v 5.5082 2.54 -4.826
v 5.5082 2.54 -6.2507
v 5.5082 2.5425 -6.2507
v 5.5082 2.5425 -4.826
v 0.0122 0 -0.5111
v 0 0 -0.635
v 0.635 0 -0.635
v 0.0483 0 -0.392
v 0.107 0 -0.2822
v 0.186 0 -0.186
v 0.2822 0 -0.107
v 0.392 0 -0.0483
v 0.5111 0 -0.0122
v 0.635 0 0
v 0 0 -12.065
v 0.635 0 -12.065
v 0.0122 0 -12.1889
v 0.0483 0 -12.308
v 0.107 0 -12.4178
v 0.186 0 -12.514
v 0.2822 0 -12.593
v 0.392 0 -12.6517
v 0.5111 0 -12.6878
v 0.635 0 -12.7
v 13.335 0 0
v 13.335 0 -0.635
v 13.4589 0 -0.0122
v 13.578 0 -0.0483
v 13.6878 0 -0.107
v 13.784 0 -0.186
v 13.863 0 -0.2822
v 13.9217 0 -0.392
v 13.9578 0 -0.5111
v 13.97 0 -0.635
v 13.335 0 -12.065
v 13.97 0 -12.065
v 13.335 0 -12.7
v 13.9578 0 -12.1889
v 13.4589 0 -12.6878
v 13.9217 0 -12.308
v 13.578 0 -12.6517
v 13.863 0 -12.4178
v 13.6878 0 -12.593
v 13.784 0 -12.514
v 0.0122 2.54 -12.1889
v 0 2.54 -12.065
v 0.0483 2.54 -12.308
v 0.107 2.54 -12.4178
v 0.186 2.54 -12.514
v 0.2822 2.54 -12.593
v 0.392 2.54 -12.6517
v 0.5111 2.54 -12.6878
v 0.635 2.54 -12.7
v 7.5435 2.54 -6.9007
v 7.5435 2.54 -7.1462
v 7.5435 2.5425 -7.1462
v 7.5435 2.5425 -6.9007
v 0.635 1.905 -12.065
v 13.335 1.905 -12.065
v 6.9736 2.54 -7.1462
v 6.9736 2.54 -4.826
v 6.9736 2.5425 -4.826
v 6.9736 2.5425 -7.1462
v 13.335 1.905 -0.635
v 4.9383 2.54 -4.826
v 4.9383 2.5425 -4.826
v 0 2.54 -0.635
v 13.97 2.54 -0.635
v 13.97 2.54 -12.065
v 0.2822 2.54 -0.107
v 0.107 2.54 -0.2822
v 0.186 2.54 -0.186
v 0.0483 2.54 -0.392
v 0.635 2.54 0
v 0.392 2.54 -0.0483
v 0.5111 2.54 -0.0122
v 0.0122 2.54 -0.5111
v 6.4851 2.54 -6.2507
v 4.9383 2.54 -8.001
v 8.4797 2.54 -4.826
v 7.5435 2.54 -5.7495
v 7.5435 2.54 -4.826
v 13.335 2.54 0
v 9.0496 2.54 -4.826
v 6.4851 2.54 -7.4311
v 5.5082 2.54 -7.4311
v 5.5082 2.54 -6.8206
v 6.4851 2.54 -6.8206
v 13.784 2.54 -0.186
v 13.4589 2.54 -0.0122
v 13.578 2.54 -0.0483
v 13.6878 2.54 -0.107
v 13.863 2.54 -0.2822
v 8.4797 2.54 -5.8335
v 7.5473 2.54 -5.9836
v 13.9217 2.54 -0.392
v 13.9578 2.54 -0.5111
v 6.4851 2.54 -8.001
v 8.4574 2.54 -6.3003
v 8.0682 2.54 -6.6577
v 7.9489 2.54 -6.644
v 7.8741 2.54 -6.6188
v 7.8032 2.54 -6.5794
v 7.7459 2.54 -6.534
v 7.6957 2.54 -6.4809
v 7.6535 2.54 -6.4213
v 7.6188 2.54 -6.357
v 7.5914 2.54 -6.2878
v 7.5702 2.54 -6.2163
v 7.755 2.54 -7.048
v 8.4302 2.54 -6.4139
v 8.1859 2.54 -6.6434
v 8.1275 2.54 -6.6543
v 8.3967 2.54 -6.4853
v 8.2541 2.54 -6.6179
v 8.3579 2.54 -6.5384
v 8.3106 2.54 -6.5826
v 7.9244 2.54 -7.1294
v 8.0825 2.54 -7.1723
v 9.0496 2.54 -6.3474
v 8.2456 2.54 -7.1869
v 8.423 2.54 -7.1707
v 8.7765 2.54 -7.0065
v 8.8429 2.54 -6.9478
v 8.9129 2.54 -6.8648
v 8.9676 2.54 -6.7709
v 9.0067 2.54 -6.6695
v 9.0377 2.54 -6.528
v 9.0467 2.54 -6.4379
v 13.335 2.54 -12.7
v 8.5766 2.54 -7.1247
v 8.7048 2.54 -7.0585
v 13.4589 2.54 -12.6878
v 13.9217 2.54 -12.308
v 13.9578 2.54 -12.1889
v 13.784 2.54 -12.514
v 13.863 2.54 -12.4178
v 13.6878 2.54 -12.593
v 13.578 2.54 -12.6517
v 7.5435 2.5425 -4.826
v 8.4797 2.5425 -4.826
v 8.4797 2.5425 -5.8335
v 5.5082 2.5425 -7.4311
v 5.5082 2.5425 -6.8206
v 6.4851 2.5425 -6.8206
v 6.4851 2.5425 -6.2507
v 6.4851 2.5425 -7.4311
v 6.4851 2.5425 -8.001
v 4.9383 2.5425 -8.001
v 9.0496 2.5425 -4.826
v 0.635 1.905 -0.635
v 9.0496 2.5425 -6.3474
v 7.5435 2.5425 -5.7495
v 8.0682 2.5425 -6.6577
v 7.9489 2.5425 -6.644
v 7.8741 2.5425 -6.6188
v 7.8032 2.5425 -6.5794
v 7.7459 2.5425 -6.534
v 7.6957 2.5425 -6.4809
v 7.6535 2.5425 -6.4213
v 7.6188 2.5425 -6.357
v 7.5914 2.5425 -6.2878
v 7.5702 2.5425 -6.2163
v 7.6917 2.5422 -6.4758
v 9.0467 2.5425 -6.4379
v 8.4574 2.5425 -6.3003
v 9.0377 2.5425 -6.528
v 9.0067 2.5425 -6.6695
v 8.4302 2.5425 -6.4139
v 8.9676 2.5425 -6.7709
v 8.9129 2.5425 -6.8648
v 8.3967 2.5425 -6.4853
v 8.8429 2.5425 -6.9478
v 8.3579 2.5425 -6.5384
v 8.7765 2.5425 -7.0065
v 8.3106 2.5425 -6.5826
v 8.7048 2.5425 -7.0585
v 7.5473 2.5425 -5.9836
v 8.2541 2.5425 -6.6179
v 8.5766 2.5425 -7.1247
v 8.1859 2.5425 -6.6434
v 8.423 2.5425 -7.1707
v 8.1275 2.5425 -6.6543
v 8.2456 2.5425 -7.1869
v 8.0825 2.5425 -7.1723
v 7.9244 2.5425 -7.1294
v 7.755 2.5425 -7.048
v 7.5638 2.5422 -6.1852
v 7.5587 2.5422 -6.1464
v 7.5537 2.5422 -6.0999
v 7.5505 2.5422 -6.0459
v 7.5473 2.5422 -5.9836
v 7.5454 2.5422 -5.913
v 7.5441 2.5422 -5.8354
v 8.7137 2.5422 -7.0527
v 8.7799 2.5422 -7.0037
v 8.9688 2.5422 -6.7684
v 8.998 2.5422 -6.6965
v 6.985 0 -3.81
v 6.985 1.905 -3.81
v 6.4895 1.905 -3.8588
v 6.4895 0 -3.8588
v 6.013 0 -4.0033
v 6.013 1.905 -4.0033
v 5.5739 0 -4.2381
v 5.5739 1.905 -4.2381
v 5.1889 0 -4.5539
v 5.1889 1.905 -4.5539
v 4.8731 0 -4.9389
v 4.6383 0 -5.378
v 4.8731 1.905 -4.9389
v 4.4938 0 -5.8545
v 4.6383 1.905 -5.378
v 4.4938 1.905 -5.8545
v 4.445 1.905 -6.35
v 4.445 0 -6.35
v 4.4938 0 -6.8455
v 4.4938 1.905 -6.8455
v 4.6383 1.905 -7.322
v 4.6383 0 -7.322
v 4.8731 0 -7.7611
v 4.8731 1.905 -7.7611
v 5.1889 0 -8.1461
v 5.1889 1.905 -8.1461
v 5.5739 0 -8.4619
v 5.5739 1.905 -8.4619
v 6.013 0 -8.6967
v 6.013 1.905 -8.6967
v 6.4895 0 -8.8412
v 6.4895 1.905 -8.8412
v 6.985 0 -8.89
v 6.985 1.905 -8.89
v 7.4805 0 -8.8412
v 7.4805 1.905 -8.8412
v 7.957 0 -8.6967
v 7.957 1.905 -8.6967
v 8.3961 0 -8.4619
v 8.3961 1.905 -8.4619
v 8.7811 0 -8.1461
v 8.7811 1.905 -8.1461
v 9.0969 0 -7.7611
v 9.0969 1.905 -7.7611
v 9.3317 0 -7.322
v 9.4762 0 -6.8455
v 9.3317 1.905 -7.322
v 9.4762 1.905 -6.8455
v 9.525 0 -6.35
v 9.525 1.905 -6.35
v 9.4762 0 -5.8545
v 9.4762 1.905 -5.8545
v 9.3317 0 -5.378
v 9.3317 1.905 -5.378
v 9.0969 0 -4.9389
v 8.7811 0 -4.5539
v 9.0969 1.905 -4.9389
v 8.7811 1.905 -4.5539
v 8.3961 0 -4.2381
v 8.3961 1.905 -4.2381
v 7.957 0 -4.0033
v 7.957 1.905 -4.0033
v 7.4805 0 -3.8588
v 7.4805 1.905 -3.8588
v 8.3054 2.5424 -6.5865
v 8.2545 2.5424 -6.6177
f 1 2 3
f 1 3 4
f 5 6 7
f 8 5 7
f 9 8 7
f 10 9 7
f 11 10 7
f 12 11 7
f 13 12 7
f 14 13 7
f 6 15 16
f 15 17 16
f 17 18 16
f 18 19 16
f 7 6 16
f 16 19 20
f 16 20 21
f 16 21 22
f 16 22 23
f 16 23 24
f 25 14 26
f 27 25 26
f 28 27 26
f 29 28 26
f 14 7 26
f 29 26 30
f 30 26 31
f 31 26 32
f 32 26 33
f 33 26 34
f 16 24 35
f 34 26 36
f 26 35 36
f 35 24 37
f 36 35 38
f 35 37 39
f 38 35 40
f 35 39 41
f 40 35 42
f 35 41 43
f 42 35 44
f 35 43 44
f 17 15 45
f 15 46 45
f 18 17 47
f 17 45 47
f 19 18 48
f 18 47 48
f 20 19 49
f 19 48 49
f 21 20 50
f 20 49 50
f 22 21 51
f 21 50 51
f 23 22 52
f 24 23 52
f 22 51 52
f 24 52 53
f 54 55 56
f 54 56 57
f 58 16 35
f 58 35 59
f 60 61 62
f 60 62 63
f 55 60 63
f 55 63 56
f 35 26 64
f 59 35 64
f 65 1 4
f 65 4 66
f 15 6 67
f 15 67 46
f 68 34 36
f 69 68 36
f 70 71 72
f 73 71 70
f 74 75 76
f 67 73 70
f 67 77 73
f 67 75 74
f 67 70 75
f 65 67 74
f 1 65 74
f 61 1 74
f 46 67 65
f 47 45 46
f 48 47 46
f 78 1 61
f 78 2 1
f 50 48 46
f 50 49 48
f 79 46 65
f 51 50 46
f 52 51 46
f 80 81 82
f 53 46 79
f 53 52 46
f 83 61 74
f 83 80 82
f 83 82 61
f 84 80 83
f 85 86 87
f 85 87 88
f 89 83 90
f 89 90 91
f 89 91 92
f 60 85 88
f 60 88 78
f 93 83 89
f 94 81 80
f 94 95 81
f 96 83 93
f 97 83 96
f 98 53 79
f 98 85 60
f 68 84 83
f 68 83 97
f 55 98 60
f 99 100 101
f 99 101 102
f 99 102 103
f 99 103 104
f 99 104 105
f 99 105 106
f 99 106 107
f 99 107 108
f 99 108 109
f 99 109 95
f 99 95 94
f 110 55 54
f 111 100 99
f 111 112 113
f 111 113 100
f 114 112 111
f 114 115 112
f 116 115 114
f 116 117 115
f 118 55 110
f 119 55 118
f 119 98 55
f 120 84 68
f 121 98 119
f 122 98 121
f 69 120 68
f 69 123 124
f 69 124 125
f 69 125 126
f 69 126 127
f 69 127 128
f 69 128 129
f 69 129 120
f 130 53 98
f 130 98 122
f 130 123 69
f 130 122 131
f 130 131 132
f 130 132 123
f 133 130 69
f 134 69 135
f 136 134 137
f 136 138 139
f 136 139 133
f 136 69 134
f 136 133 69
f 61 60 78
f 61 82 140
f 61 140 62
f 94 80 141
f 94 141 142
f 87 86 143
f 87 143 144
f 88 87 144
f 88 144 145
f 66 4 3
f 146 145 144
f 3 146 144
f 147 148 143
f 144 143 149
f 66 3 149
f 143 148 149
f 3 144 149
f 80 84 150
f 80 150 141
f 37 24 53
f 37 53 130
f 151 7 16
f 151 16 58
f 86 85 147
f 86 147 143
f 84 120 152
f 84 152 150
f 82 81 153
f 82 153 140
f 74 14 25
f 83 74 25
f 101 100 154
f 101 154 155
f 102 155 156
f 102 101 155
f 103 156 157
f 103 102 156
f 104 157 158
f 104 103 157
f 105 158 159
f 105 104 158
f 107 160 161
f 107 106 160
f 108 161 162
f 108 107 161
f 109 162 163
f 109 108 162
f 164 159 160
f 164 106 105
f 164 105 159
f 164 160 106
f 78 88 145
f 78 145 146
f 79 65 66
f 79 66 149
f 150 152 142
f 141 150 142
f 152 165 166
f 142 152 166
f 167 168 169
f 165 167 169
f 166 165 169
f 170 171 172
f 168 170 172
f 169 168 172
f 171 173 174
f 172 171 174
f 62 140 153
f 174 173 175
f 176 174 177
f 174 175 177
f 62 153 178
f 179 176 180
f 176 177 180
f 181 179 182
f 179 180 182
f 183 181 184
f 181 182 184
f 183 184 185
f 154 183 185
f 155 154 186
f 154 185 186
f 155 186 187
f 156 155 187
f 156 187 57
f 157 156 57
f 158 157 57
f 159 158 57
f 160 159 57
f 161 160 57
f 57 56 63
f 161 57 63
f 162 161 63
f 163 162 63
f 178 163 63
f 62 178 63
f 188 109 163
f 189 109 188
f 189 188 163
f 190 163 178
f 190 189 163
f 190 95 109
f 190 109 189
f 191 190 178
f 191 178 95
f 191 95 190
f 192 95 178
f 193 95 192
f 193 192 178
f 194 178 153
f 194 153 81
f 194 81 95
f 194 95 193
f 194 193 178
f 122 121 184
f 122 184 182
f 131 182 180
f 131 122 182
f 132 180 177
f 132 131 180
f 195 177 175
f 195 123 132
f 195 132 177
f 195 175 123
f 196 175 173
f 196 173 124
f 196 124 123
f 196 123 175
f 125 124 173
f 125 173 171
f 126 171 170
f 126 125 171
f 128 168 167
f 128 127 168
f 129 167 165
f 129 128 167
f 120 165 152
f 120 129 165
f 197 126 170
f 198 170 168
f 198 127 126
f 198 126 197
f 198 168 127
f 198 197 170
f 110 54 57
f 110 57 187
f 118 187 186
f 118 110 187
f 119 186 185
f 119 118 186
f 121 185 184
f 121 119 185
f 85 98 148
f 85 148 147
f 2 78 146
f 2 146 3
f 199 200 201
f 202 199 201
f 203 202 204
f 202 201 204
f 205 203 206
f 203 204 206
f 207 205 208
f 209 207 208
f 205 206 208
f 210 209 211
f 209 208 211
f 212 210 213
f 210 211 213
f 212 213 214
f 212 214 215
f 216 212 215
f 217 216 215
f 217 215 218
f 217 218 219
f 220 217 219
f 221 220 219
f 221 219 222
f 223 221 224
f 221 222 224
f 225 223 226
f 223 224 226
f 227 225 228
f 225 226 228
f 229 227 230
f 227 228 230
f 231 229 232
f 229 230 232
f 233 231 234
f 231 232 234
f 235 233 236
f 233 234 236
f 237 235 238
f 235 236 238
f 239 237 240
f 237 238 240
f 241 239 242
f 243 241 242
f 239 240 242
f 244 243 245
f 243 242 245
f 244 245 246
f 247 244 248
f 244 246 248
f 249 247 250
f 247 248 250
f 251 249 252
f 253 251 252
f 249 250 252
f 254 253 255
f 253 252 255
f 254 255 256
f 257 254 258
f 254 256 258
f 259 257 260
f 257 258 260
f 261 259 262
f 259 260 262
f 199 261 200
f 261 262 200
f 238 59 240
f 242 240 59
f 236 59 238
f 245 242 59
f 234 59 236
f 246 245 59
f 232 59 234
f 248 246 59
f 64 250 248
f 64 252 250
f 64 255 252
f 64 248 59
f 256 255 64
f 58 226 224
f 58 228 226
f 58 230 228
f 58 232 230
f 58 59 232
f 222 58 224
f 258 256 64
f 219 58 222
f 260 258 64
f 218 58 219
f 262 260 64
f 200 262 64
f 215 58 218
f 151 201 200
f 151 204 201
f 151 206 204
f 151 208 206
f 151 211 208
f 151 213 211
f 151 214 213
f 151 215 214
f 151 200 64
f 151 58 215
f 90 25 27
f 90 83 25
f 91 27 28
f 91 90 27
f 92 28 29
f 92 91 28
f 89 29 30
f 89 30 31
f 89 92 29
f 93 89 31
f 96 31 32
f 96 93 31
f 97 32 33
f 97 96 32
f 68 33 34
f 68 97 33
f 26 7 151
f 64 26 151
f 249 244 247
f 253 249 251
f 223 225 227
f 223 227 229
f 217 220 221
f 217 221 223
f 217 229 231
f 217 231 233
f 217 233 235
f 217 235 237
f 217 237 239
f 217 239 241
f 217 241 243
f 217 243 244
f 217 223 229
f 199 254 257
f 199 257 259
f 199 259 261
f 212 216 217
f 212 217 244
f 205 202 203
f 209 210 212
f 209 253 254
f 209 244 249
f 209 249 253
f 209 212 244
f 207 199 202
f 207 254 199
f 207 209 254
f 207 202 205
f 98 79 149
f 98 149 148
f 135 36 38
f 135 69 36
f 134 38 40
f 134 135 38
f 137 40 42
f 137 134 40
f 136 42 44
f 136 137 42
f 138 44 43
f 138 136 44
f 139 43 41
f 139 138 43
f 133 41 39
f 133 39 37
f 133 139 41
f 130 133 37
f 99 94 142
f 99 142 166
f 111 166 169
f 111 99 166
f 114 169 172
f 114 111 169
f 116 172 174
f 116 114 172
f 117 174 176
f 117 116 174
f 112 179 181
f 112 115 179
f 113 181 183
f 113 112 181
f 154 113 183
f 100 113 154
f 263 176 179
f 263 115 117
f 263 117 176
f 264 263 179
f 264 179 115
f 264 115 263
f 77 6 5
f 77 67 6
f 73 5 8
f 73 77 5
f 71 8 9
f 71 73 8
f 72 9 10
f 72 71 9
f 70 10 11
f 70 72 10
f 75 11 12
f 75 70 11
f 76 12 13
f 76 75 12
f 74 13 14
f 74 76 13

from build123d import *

# Parameters (mm, degrees)
SKETCH1_W           = 13.97
SKETCH1_H           = 12.7
BOSS_EXTRUDE1_DEPTH = 2.54
FILLET1_R           = 0.635
SHELL1_START        = 0.635
SHELL1_OUTLINE_W    = 1.905
SHELL1_OUTLINE_H    = 11.43
SHELL1_DEPTH        = 12.7
SKETCH2_R           = 2.54
BOSS_EXTRUDE2_DEPTH = 1.905
BOSS_EXTRUDE3_DEPTH = 0.00254


# Read off the part's stored shape, not the designer's step: Shell1
with BuildPart() as part:
    # Sketch1 → Boss-Extrude1 (new body)
    with BuildSketch(Plane(origin=(0, 0, 0), x_dir=(1, 0, 0), z_dir=(0, 1, 0))):
        with Locations((6.985, 6.35)):
            Rectangle(SKETCH1_W, SKETCH1_H)
    extrude(amount=BOSS_EXTRUDE1_DEPTH)

    # Fillet1
    fillet1_edges = [part.edges().sort_by_distance(p)[0] for p in [
        (0, 1.27, -12.7),
        (13.97, 1.27, -12.7),
        (13.97, 1.27, 0),
        (0, 1.27, 0),
    ]]
    fillet(fillet1_edges, radius=FILLET1_R)

    # Shell1 outline → Shell1 (cut)
    with BuildSketch(Plane.YZ.offset(SHELL1_START)):
        with Locations((0.9525, -6.35)):
            Rectangle(SHELL1_OUTLINE_W, SHELL1_OUTLINE_H)
    extrude(amount=SHELL1_DEPTH, mode=Mode.SUBTRACT)

    # Sketch2 → Boss-Extrude2 (add)
    with BuildSketch(Plane(origin=(0, 1.905, 0), x_dir=(-1, 0, 0), z_dir=(0, -1, 0))):
        with Locations(Location((-6.985, 6.35, 0), (0, 0, 270))):
            Circle(SKETCH2_R)
    extrude(amount=BOSS_EXTRUDE2_DEPTH)

    # Sketch3 → Boss-Extrude3 (add)
    with BuildSketch(Plane(origin=(0, 2.54, 0), x_dir=(1, 0, 0), z_dir=(0, 1, 0))):
        Polygon((4.938346154, 8.001), (6.485141026, 8.001), (6.485141026, 7.431128205), (5.508217949, 7.431128205), (5.508217949, 6.820551282), (6.485141026, 6.820551282), (6.485141026, 6.250679487), (5.508217949, 6.250679487), (5.508217949, 4.826), (4.938346154, 4.826), align=None)
        with BuildLine():
            Line((6.973602564, 7.146192308), (7.543474359, 7.146192308))
            Line((7.543474359, 7.146192308), (7.543474359, 6.900689503))
            add(Edge.make_bspline(
                [(7.543474359, 6.900689503), (7.575985262, 6.925977153), (7.638119919, 6.974306769), (7.732575324, 7.035927275), (7.821729533, 7.086361185), (7.907569887, 7.124723797), (7.991711475, 7.152324047), (8.075517031, 7.172153181), (8.160234588, 7.18485032), (8.217185351, 7.18621543), (8.245637821, 7.186897436)],
                knots=[0, 0, 0, 0, 1.276643801, 2.439914479, 3.493451431, 4.44993799, 5.350072675, 6.235028322, 7.118224225, 8, 8, 8, 8], degree=3))
            add(Edge.make_bspline(
                [(8.245637821, 7.186897436), (8.274499022, 7.186118044), (8.331155985, 7.184588033), (8.41458024, 7.173886845), (8.494284014, 7.154396591), (8.57116351, 7.128518806), (8.644436227, 7.094361613), (8.714999799, 7.053805489), (8.781338547, 7.004405385), (8.822192885, 6.966784638), (8.842858373, 6.947754808)],
                knots=[0, 0, 0, 0, 1.048836932, 2.058954983, 3.049370783, 4.026390553, 5.001981509, 5.982488534, 6.97947532, 8, 8, 8, 8], degree=3))
            add(Edge.make_bspline(
                [(8.842858373, 6.947754808), (8.859432856, 6.93011972), (8.892703126, 6.894720476), (8.934569582, 6.834143303), (8.970495709, 6.768103097), (8.999932179, 6.695838062), (9.021684544, 6.616951149), (9.038418936, 6.532395199), (9.047808895, 6.441696762), (9.048968129, 6.379387791), (9.049564103, 6.347354167)],
                knots=[0, 0, 0, 0, 0.889584746, 1.785680191, 2.700364693, 3.65222533, 4.649950538, 5.707241244, 6.821271309, 8, 8, 8, 8], degree=3))
            Line((9.049564103, 6.347354167), (9.049564103, 4.826))
            Line((9.049564103, 4.826), (8.479692308, 4.826))
            Line((8.479692308, 4.826), (8.479692308, 5.833451923))
            add(Edge.make_bspline(
                [(8.479692308, 5.833451923), (8.479571792, 5.86631325), (8.479340847, 5.929285883), (8.477567699, 6.019409185), (8.474105481, 6.10080223), (8.470949759, 6.173613213), (8.464753823, 6.237583603), (8.459166228, 6.293118384), (8.450592604, 6.339713739), (8.439436929, 6.389834035), (8.419956373, 6.443496978), (8.38971376, 6.500039753), (8.351346764, 6.548074101), (8.306422447, 6.587936766), (8.254990424, 6.619471791), (8.197672176, 6.641658645), (8.134774997, 6.655486038), (8.090948982, 6.656963488), (8.068188902, 6.657730769)],
                knots=[0, 0, 0, 0, 1.49886392, 2.872294502, 4.110984203, 5.214877267, 6.195405875, 7.042225351, 7.75923308, 8.355011229, 9.382752534, 10.352059385, 11.267231453, 12.171456522, 13.078624015, 14.003401117, 14.963110155, 16, 16, 16, 16], degree=3))
            add(Edge.make_bspline(
                [(8.068188902, 6.657730769), (8.038588461, 6.656229723), (7.980684244, 6.653293385), (7.896937378, 6.631150715), (7.820017276, 6.593492551), (7.75055244, 6.541381225), (7.689204465, 6.477043335), (7.638676644, 6.400313021), (7.597233451, 6.313042165), (7.579412262, 6.249320264), (7.570187099, 6.216334535)],
                knots=[0, 0, 0, 0, 0.984188326, 1.925263693, 2.85911992, 3.81709677, 4.80007086, 5.801799564, 6.862098548, 8, 8, 8, 8], degree=3))
            add(Edge.make_bspline(
                [(7.570187099, 6.216334535), (7.56789428, 6.205975146), (7.562780832, 6.182871626), (7.558575667, 6.143840753), (7.552725978, 6.097534401), (7.550534244, 6.043114556), (7.546723058, 5.980838765), (7.5453135, 5.910624637), (7.543901419, 5.83260985), (7.543621428, 5.778119486), (7.543474359, 5.749497596)],
                knots=[0, 0, 0, 0, 0.543362196, 1.211806945, 2.009705693, 2.934833164, 4.000995085, 5.207458376, 6.533175157, 8, 8, 8, 8], degree=3))
            Line((7.543474359, 5.749497596), (7.543474359, 4.826))
            Line((7.543474359, 4.826), (6.973602564, 4.826))
            Line((6.973602564, 4.826), (6.973602564, 7.146192308))
        make_face()
    extrude(amount=BOSS_EXTRUDE3_DEPTH)


solid = part.part
